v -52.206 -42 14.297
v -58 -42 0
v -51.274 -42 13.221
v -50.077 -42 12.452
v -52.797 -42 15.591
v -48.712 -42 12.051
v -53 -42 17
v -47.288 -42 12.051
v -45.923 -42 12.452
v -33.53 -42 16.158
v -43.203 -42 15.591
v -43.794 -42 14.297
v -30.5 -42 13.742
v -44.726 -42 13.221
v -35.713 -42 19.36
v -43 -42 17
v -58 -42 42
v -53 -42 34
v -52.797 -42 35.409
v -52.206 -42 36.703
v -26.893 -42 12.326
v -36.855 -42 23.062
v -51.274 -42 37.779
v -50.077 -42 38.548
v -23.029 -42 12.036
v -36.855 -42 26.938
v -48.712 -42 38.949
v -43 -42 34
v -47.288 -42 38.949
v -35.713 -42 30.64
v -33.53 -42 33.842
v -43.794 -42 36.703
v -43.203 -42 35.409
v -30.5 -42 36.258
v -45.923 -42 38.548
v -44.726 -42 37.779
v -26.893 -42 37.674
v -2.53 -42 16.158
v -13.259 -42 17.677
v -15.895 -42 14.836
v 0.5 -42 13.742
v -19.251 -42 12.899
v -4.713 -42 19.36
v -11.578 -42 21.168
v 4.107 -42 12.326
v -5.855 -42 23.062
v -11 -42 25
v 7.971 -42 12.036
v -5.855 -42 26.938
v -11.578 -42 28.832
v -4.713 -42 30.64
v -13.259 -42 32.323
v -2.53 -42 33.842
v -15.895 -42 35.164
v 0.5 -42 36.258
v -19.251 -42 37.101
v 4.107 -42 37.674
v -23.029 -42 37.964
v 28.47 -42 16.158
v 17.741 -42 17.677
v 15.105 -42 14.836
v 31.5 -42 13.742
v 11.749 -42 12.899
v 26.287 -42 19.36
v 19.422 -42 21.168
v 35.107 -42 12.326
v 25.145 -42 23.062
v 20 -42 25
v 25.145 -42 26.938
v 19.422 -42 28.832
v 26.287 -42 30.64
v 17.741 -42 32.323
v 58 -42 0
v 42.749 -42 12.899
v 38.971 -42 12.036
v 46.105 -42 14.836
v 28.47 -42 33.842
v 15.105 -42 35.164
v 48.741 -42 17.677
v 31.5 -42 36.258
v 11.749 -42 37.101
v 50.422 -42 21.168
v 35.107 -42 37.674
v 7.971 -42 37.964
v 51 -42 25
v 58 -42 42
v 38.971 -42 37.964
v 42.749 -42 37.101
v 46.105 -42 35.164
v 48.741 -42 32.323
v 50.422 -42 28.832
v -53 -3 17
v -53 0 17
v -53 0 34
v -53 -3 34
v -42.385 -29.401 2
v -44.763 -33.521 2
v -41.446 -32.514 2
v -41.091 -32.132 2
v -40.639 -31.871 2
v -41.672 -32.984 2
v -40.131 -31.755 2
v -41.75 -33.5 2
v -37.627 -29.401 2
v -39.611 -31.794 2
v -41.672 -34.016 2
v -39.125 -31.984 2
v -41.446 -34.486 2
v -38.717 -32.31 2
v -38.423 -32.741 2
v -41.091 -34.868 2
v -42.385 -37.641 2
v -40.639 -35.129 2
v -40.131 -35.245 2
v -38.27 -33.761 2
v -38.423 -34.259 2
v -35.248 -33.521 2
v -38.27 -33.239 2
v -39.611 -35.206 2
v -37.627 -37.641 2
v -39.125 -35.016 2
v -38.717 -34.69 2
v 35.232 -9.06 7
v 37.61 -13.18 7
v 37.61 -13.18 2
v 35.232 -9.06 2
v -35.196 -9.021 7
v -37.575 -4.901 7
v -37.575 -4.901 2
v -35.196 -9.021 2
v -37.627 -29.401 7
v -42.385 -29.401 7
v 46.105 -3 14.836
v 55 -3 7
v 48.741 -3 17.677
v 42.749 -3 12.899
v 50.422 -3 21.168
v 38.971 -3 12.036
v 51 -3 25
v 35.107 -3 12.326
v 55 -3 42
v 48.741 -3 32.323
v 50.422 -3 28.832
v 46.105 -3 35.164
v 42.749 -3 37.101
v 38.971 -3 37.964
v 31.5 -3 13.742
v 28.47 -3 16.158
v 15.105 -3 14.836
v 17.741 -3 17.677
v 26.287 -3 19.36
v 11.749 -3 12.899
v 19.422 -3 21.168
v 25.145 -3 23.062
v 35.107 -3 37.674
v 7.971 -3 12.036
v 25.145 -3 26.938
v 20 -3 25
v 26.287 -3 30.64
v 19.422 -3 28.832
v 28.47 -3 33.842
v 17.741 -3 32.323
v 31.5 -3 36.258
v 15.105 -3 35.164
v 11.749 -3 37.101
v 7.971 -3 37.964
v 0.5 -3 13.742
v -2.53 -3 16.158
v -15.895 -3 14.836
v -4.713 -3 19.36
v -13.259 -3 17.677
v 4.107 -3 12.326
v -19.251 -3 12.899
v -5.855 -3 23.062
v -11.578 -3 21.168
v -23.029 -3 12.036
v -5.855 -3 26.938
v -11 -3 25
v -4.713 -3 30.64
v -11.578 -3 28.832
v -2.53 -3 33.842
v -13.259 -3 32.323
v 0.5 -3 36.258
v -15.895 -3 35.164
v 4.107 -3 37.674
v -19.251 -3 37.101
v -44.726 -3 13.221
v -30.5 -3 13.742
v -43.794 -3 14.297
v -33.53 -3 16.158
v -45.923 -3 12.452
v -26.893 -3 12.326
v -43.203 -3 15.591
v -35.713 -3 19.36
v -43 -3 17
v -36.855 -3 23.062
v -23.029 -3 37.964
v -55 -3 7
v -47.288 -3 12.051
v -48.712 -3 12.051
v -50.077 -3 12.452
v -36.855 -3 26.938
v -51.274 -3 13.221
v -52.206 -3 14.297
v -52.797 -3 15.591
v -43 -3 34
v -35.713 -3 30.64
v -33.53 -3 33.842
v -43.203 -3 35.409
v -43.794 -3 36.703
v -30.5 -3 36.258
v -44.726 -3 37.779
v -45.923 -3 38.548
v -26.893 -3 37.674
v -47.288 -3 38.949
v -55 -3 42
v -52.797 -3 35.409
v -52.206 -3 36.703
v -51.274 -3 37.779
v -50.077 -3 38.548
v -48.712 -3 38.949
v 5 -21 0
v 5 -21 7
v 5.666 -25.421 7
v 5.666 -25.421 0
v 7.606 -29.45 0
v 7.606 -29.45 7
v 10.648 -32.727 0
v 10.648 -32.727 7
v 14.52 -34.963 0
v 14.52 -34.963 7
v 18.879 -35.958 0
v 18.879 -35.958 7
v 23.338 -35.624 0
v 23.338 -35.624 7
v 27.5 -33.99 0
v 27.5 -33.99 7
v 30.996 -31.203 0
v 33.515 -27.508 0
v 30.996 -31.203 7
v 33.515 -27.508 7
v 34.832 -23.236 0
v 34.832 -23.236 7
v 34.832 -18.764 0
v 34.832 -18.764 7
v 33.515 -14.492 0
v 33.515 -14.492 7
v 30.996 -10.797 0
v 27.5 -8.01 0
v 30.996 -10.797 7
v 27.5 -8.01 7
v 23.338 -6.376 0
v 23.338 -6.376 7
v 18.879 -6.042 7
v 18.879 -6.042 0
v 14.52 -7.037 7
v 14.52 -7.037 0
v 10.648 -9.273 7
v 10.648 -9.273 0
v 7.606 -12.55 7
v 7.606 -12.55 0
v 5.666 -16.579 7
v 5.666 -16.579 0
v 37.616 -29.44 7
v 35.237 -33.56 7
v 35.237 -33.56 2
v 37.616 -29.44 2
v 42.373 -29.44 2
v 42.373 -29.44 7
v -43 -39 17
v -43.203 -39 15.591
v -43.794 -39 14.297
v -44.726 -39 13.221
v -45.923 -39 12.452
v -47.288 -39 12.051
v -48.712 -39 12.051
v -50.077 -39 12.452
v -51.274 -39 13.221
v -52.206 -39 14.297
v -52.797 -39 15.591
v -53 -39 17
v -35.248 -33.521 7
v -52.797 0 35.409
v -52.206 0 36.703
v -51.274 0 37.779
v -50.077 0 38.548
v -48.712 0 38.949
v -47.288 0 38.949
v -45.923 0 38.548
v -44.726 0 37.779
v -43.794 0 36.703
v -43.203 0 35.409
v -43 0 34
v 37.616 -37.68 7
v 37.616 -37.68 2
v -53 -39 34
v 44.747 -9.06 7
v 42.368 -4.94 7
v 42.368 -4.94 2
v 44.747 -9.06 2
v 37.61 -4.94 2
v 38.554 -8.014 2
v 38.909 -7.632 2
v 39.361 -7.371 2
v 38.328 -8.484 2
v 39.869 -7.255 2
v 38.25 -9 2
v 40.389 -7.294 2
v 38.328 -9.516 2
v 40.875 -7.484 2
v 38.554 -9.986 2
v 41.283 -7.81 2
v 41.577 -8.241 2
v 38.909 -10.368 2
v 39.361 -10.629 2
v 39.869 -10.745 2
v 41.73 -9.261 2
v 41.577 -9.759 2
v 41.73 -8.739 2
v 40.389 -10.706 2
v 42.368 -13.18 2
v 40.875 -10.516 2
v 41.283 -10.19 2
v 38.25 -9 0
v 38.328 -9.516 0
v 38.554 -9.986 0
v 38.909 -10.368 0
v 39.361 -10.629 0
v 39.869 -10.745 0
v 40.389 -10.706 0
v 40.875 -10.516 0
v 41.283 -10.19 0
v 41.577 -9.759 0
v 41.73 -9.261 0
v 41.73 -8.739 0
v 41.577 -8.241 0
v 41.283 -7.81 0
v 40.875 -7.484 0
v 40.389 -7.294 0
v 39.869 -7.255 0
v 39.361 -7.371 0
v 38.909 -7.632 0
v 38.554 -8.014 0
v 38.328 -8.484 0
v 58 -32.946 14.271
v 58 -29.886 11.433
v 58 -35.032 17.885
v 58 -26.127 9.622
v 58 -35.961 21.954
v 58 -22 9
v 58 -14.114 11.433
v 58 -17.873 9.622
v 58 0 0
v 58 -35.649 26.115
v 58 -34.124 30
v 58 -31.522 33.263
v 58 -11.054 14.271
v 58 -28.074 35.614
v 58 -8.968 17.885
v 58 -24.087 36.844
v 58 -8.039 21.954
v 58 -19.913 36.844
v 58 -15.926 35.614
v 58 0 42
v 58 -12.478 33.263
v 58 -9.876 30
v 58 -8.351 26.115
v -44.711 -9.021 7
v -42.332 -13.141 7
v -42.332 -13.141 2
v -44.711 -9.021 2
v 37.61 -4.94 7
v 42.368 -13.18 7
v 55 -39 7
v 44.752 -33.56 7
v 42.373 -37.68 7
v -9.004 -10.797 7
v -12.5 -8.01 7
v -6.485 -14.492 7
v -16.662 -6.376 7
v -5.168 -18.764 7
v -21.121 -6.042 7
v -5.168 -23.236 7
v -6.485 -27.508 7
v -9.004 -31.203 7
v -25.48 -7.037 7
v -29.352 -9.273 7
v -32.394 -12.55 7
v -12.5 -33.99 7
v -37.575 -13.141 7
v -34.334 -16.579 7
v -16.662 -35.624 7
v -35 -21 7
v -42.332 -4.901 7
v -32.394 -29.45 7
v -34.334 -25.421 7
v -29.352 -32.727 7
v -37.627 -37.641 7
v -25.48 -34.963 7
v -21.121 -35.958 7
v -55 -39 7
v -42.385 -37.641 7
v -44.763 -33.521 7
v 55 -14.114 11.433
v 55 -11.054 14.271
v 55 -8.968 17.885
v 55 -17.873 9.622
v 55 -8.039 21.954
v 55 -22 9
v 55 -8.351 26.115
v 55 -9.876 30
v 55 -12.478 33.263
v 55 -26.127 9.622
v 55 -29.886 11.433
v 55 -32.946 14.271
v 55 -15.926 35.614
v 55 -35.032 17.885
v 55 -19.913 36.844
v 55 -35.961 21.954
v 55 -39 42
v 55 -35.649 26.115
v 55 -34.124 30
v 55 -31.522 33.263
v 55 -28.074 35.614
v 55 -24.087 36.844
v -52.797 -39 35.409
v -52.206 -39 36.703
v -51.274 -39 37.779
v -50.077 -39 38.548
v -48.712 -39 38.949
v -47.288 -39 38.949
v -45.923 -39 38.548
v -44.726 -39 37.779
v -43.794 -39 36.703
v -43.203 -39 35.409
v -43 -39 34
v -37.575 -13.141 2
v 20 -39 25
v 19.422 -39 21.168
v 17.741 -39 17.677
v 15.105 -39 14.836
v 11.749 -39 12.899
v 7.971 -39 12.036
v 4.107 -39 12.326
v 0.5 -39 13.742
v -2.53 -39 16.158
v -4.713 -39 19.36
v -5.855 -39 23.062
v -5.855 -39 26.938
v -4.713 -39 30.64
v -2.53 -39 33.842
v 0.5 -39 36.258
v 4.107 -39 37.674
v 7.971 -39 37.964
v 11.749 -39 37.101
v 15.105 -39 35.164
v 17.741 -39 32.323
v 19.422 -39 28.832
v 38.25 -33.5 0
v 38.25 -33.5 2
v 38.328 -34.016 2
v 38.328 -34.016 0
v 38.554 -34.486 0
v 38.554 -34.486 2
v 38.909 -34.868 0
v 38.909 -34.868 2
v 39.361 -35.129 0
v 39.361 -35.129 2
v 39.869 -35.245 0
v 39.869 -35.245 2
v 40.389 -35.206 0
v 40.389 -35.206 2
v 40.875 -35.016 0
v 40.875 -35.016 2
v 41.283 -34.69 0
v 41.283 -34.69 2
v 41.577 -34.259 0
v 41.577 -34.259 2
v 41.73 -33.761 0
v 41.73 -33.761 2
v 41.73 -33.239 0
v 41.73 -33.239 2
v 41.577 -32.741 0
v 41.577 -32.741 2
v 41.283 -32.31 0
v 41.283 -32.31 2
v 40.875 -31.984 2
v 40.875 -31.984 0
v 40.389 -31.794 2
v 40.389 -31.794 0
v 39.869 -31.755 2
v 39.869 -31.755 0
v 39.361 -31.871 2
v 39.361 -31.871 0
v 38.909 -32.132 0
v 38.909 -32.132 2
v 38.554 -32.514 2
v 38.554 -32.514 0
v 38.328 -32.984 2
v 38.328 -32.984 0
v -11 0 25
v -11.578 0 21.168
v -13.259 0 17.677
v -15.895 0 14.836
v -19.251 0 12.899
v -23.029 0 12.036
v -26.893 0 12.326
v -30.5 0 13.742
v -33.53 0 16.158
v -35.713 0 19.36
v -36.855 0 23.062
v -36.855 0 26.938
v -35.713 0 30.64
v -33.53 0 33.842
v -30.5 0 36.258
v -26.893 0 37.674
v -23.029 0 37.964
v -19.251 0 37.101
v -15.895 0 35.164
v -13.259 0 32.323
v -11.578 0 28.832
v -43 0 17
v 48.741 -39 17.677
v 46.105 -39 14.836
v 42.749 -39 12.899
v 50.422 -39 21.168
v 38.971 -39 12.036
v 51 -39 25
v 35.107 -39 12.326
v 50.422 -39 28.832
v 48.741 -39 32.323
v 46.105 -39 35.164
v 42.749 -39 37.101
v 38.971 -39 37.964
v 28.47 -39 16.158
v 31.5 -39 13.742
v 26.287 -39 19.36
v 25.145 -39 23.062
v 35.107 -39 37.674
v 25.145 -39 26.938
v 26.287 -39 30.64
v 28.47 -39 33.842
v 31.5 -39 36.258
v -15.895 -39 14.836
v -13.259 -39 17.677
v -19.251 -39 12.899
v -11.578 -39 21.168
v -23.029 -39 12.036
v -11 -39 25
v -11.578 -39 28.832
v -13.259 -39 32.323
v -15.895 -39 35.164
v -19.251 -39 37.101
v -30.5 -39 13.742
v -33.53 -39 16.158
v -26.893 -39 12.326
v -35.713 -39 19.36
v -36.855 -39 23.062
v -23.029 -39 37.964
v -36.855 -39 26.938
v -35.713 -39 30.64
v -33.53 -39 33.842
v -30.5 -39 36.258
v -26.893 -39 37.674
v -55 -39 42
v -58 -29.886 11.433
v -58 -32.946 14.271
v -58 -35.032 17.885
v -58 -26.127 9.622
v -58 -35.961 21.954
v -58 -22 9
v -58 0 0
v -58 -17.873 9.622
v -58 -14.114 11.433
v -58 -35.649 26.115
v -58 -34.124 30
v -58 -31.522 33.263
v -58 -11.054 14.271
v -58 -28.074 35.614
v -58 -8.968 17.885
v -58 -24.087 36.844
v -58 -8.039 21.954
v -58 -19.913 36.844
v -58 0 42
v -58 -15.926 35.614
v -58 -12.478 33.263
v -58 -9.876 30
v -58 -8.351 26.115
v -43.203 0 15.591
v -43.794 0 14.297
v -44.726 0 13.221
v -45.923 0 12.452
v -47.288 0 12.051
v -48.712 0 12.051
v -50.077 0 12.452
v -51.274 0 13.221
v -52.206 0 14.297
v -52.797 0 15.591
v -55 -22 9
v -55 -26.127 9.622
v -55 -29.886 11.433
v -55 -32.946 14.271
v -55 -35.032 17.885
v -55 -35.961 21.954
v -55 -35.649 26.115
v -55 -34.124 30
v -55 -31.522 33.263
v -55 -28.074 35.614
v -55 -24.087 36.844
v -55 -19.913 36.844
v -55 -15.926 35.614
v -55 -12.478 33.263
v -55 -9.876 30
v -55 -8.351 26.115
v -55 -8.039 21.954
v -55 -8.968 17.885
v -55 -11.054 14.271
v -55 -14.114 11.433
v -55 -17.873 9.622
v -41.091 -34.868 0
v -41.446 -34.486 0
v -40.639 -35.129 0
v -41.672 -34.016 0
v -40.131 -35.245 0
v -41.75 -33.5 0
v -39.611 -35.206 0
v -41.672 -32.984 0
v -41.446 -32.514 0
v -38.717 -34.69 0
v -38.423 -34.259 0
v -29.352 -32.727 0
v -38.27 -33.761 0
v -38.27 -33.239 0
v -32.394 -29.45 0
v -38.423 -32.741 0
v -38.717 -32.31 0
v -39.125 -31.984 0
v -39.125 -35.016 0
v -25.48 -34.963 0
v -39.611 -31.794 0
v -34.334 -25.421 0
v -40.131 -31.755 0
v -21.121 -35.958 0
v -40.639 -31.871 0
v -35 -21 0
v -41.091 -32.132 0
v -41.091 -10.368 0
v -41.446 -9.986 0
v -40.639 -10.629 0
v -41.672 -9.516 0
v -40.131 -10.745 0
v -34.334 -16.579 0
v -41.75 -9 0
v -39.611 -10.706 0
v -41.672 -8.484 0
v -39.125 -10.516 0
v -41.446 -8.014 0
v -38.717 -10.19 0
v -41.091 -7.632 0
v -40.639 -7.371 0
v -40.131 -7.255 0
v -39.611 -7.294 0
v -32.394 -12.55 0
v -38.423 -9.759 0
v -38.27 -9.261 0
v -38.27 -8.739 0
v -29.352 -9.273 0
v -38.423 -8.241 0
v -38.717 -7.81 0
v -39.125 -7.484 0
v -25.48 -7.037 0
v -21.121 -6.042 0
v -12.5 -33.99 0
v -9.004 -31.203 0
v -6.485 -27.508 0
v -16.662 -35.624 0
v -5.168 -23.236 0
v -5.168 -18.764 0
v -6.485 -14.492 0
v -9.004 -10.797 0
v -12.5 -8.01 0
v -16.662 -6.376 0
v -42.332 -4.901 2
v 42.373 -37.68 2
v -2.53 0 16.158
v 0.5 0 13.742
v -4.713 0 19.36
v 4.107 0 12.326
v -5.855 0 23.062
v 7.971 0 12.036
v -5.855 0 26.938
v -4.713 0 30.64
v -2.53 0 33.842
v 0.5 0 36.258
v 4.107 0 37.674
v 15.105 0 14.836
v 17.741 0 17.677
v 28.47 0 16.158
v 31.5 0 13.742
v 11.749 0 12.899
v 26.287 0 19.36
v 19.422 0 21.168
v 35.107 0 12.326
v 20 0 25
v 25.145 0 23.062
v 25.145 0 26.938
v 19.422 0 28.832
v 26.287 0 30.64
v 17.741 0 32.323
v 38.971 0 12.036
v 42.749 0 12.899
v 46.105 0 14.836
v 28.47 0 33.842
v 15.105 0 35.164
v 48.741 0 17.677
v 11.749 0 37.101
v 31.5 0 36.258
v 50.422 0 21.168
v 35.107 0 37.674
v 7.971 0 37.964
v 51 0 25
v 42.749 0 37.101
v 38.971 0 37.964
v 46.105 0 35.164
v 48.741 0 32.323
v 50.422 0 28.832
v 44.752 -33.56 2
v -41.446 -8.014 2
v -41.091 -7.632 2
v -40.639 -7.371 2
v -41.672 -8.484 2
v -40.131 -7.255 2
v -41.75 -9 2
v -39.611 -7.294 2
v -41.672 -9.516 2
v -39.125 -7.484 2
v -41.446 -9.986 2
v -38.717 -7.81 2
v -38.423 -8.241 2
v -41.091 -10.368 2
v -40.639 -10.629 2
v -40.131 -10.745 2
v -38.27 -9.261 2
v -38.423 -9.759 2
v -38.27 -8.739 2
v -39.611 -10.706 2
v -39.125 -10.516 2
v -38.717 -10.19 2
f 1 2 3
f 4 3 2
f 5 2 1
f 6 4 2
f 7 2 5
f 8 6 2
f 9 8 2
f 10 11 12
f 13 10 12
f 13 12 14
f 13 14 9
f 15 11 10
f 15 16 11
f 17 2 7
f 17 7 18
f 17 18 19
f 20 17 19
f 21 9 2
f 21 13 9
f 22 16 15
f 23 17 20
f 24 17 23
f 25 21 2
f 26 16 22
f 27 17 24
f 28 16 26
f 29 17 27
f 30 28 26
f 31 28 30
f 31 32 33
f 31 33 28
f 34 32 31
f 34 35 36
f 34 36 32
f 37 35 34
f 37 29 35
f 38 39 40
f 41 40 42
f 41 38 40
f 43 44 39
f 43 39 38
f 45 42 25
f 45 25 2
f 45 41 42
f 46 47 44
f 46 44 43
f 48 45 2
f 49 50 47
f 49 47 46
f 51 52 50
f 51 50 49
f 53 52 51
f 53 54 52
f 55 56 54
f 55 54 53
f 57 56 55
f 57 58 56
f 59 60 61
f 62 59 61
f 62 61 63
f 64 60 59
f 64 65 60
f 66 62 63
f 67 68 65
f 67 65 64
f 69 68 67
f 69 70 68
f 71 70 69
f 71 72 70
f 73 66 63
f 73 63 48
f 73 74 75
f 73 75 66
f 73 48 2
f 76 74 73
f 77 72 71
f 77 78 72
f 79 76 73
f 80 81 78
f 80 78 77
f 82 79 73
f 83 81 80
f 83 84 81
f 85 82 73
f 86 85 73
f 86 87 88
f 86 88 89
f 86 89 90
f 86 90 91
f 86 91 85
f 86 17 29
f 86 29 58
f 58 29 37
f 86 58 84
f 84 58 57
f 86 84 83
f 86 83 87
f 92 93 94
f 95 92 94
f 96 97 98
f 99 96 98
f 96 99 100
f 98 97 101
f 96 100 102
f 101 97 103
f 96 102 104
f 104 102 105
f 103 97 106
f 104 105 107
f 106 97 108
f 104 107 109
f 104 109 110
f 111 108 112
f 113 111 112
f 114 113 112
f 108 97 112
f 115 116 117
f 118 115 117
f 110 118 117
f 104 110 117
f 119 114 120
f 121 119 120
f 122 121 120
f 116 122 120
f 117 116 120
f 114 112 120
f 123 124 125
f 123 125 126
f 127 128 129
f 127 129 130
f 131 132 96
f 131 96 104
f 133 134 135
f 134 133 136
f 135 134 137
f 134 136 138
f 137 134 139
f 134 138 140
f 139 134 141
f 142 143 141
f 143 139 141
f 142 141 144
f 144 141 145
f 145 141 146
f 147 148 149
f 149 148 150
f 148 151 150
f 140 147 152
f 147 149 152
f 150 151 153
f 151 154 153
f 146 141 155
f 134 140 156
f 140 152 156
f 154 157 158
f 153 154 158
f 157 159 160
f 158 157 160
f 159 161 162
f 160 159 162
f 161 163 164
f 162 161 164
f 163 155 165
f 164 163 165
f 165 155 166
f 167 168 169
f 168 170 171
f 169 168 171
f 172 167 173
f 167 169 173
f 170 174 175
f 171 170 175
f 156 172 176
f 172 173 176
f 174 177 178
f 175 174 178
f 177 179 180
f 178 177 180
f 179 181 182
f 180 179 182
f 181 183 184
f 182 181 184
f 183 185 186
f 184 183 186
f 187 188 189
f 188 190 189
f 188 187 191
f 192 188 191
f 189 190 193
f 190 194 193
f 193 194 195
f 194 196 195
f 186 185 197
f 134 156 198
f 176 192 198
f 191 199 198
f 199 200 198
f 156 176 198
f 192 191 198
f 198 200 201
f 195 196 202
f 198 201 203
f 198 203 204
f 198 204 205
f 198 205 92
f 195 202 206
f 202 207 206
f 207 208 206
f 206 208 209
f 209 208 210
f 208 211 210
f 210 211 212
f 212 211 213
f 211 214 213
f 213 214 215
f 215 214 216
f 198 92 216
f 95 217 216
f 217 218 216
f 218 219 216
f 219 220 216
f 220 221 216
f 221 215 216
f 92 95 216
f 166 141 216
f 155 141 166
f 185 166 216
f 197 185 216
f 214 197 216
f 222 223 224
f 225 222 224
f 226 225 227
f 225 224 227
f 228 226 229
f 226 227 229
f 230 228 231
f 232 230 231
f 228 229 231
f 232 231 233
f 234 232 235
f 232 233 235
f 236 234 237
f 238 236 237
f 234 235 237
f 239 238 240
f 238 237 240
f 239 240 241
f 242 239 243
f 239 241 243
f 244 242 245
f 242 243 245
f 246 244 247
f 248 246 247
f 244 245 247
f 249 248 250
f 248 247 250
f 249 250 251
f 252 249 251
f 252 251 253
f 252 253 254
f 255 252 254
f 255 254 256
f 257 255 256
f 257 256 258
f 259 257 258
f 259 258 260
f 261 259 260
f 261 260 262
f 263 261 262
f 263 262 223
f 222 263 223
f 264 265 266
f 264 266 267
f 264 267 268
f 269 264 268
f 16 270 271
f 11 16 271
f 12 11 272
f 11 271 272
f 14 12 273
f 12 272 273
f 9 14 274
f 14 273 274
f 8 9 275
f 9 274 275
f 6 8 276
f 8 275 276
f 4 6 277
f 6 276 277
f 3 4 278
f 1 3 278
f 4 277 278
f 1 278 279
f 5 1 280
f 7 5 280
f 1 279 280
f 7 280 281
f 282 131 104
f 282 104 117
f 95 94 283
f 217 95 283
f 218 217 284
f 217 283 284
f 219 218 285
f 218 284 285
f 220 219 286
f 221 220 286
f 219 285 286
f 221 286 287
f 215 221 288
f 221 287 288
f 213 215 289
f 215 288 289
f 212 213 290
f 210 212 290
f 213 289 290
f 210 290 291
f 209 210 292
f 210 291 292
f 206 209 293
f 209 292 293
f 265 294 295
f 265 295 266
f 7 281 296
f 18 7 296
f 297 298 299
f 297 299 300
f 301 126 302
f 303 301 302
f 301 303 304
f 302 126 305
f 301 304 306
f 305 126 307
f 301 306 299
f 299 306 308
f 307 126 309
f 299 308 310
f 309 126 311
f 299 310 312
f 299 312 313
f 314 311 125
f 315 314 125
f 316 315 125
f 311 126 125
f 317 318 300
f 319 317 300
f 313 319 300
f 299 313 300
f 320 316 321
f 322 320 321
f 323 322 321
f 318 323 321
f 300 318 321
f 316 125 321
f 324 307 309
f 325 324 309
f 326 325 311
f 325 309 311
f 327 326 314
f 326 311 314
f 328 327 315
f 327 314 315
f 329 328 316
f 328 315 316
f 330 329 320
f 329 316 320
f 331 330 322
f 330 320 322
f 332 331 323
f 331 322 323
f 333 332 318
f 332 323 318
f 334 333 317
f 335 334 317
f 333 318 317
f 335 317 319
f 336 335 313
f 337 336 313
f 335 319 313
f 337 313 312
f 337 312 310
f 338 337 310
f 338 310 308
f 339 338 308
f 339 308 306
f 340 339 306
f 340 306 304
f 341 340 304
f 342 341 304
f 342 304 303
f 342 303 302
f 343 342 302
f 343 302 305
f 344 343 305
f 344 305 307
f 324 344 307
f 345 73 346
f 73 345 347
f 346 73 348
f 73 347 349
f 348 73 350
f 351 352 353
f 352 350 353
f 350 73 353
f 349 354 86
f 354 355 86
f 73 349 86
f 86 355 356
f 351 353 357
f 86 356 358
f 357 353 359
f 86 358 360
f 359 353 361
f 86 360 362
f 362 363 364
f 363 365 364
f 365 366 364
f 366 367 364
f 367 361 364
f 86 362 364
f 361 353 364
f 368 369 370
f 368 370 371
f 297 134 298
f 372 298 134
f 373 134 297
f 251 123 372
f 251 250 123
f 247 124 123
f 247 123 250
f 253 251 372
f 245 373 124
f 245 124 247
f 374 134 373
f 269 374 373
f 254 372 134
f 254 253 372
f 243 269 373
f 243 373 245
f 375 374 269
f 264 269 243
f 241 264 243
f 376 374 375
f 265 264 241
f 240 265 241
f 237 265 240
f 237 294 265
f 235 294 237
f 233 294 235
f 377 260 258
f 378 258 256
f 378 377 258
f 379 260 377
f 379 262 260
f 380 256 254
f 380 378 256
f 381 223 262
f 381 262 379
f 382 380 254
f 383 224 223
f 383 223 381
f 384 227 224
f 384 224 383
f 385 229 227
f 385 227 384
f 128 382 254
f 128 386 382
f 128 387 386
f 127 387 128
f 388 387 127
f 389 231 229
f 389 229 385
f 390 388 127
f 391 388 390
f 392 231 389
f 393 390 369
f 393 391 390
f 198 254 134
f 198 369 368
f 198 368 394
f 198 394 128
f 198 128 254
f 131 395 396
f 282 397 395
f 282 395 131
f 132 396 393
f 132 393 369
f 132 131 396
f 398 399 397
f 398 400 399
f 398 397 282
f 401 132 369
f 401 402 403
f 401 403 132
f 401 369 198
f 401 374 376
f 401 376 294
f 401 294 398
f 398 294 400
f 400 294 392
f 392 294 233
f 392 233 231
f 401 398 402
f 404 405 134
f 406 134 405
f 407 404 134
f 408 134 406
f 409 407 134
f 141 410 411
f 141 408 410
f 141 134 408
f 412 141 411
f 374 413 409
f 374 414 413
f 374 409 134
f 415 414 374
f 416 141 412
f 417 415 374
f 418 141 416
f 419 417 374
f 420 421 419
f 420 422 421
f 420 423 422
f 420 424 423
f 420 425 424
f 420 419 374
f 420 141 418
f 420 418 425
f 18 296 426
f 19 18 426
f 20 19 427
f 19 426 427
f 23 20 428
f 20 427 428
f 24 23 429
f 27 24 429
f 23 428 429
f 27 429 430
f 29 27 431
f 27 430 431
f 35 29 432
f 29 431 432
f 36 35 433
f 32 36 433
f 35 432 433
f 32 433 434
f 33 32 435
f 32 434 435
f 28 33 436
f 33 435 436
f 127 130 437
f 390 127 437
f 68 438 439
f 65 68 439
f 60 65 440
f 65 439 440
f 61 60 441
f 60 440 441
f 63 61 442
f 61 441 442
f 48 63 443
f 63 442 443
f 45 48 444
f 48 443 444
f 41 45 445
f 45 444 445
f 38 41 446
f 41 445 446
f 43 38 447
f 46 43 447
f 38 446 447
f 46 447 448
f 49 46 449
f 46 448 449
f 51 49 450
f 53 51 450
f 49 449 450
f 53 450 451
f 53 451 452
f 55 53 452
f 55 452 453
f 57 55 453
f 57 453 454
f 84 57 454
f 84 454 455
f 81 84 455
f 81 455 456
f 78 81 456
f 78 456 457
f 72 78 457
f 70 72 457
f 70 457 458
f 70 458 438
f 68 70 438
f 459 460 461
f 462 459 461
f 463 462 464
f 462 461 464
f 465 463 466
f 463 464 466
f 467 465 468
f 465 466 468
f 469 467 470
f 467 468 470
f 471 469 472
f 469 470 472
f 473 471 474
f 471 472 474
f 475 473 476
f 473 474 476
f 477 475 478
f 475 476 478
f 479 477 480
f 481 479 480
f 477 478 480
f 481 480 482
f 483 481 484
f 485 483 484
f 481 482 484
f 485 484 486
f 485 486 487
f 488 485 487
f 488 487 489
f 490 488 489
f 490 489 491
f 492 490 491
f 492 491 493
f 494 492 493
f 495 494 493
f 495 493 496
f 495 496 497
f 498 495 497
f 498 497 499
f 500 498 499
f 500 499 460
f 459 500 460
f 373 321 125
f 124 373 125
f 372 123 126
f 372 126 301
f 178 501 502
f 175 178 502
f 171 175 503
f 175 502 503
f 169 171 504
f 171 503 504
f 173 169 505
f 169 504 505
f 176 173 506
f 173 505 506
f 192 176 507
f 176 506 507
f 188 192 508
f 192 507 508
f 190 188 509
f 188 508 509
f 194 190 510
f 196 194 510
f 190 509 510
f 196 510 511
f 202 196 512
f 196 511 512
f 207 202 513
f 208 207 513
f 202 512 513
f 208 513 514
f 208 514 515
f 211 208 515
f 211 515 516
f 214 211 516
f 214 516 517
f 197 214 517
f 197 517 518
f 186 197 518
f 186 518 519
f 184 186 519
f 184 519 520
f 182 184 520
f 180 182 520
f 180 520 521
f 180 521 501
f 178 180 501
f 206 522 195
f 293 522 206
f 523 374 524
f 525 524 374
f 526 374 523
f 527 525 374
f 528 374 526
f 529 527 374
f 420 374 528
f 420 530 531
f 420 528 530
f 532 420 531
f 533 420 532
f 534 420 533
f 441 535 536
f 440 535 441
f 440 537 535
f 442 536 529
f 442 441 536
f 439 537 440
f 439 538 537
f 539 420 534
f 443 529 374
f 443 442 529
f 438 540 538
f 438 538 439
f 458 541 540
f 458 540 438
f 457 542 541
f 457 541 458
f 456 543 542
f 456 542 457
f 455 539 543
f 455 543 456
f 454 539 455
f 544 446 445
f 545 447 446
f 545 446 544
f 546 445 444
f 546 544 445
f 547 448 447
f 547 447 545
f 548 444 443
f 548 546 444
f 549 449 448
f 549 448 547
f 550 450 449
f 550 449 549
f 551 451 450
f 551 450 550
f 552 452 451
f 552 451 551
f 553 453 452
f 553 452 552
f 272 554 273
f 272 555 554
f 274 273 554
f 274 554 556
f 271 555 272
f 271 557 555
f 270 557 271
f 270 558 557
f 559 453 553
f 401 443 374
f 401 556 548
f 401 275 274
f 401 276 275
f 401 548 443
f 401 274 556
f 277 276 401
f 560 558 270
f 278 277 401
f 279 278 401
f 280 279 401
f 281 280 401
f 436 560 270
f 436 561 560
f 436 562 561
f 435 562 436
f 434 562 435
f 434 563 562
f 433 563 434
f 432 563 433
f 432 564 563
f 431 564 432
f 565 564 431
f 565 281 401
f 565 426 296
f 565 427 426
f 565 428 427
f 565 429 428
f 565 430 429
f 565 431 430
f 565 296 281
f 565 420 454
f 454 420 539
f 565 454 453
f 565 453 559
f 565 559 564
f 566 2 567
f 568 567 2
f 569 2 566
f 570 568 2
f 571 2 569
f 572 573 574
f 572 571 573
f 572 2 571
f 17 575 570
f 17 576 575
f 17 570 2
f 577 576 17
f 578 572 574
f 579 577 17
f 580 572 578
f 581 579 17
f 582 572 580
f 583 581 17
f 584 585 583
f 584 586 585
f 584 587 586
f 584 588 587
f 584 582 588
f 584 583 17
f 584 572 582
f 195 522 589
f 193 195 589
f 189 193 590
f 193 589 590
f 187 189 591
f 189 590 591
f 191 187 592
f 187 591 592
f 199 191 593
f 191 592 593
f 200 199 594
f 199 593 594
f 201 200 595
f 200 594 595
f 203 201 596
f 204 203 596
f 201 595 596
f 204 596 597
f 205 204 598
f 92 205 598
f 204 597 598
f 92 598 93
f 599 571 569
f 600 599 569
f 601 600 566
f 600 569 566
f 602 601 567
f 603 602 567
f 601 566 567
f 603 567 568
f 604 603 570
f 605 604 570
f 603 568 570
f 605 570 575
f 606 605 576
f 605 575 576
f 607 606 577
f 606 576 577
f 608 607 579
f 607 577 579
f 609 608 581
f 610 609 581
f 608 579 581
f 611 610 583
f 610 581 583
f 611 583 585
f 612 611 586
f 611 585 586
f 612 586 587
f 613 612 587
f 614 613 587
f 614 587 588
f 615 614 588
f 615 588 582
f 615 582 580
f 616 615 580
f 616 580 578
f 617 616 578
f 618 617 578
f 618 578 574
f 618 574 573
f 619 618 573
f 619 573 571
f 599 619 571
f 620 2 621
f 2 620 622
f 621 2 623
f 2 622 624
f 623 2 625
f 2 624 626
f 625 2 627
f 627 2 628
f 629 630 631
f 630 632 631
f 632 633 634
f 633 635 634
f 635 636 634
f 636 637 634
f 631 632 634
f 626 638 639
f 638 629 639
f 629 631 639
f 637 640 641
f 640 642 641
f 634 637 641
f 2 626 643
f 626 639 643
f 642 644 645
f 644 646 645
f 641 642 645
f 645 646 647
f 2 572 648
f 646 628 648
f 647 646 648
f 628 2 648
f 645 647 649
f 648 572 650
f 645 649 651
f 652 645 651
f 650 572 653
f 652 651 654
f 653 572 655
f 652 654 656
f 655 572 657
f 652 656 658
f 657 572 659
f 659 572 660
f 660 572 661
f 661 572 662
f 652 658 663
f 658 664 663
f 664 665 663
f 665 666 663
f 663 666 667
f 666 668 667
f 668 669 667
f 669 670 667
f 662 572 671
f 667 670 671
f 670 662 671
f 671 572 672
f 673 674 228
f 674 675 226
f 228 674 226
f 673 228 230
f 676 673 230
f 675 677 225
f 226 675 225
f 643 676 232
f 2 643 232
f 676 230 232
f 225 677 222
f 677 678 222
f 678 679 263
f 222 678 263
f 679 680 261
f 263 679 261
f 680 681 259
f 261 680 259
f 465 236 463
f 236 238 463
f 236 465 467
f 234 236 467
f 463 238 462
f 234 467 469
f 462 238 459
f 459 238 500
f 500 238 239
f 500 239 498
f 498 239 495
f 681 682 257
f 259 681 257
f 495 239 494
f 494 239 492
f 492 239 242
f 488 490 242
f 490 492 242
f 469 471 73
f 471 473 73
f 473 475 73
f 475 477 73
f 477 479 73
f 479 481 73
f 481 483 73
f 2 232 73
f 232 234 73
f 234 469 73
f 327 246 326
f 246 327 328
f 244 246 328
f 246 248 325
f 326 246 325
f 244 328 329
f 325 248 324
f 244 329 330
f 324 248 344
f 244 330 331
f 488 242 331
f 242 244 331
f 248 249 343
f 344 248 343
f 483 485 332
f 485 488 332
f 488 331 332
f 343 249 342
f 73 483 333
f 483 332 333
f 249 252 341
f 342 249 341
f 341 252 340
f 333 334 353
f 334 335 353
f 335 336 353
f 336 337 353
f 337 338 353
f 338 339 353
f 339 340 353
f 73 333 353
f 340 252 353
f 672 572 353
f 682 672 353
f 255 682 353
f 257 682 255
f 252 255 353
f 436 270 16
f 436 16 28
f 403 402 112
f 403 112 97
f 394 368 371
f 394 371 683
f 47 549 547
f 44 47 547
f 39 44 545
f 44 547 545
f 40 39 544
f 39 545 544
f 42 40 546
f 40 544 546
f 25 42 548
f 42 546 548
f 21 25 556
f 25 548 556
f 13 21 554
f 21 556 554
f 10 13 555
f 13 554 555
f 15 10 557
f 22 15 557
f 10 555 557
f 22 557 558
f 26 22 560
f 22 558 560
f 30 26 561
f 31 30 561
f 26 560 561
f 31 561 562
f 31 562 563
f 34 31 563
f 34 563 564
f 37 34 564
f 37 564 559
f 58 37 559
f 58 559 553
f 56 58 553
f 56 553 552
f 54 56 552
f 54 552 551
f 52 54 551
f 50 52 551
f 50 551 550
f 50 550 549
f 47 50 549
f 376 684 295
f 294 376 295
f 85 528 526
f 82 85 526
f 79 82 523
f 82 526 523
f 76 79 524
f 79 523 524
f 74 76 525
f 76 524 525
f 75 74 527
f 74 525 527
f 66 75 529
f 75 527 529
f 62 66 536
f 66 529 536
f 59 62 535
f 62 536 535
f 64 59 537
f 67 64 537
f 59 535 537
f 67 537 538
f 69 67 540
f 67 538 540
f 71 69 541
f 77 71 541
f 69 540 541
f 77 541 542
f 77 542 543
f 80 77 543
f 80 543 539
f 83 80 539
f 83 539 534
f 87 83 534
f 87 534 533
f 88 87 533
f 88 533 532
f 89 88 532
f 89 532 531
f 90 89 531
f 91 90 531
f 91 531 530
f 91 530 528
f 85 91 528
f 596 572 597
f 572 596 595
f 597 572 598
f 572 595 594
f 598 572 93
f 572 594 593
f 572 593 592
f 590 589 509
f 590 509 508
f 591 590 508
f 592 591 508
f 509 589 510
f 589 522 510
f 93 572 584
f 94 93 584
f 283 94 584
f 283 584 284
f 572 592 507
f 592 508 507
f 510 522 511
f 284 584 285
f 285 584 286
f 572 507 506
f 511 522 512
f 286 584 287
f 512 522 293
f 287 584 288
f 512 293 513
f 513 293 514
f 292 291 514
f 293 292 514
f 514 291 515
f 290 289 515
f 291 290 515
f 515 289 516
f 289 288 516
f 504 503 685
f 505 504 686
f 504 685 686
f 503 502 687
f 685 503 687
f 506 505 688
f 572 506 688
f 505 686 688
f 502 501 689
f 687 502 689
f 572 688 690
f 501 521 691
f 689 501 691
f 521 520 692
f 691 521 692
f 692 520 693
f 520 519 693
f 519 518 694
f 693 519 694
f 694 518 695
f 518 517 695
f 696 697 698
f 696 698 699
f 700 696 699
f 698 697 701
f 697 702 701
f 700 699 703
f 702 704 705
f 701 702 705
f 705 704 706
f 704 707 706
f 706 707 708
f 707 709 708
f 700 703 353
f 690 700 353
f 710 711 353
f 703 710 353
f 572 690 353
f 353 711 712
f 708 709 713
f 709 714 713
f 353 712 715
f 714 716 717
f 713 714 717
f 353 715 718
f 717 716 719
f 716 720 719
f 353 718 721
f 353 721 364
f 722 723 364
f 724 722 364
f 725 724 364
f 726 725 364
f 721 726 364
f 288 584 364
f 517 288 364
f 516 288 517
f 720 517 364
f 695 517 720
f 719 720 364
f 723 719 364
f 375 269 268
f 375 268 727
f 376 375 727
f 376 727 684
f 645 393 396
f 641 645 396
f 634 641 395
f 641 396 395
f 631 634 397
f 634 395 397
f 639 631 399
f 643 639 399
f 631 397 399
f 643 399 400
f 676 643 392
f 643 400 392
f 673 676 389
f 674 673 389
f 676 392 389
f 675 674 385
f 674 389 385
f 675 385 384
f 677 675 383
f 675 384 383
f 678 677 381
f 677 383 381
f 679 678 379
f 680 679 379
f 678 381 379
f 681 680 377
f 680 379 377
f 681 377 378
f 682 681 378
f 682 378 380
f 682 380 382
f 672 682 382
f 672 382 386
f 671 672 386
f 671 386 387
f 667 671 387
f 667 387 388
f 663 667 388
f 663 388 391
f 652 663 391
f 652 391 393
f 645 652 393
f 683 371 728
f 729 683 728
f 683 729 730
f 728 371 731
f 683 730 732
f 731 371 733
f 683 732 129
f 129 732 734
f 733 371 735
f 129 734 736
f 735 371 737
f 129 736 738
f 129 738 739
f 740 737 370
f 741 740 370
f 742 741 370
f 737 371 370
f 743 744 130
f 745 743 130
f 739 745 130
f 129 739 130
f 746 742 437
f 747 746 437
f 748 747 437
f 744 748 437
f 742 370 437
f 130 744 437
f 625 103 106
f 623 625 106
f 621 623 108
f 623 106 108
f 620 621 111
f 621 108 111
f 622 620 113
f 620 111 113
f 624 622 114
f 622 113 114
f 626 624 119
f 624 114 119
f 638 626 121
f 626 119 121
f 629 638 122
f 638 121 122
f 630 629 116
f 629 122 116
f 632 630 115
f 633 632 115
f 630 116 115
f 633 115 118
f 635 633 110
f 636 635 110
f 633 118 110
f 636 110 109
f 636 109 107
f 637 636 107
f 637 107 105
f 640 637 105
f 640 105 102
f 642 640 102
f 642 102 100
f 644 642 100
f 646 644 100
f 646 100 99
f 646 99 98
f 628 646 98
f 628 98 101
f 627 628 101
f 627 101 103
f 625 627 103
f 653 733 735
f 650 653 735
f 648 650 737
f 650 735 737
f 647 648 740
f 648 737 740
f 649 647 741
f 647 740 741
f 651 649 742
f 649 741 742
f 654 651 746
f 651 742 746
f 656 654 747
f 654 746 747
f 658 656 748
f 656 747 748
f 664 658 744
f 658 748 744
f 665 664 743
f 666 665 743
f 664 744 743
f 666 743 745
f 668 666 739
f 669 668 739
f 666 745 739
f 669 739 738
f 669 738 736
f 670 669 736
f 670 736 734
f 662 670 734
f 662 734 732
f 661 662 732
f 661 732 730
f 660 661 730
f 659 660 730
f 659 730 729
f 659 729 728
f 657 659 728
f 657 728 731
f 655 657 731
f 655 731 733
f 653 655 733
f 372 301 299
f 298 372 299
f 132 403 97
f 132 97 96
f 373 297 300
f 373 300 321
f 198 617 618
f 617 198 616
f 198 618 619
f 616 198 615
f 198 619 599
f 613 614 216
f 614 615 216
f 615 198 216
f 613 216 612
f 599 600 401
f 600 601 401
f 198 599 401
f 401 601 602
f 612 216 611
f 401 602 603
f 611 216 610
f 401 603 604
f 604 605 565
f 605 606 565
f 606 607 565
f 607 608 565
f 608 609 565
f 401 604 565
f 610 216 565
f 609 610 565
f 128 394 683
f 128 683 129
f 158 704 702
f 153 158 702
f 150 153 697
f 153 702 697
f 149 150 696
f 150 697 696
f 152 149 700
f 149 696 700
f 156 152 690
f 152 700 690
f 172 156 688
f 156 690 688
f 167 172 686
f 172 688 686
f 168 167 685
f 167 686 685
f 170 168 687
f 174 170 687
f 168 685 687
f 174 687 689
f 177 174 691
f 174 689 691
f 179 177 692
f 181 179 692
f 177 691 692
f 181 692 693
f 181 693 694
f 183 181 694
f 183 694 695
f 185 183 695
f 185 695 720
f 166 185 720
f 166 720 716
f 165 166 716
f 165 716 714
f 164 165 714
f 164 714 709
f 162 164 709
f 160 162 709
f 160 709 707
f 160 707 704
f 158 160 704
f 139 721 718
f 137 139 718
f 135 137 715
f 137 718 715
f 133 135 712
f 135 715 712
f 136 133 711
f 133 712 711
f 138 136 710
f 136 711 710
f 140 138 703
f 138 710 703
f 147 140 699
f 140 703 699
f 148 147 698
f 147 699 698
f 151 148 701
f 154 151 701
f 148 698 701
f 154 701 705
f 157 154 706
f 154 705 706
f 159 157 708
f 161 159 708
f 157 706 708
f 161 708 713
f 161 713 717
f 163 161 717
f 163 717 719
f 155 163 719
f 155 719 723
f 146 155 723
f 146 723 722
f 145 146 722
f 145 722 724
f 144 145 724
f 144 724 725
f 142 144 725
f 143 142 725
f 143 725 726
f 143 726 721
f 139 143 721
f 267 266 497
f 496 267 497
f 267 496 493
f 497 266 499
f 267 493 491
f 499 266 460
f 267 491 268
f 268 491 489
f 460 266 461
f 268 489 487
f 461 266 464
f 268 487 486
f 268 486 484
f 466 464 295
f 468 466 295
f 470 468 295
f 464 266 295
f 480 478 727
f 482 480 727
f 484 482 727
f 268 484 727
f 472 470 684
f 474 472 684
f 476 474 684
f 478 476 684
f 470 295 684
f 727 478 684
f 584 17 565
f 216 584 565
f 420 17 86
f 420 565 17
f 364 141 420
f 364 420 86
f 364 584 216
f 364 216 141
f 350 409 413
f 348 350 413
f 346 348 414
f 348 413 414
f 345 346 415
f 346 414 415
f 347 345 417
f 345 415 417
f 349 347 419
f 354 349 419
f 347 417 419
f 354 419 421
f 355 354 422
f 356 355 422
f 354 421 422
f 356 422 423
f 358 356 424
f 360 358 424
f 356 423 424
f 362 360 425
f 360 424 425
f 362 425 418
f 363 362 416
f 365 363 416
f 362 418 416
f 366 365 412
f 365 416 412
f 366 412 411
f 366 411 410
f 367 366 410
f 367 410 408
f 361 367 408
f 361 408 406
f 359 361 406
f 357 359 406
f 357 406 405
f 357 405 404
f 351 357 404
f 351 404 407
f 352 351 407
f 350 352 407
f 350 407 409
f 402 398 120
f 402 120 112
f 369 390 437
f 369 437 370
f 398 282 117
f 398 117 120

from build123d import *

# Parameters (mm, degrees)
SKETCH_W        = 116
SKETCH_H        = 42
PAD_DEPTH       = 42
SKETCH005_W     = 110
SKETCH005_H     = 36
POCKET_DEPTH    = 35
SKETCH006_R     = 1.75
SKETCH006_R_2   = 15
POCKET001_DEPTH = 7.001
POCKET002_DEPTH = 5
SKETCH007_R     = 13
POCKET003_DEPTH = 42.001
SKETCH008_R     = 14
POCKET004_DEPTH = 116.001


with BuildPart() as part:
    # Sketch → Pad (new body)
    with BuildSketch(Plane.XZ):
        with Locations((0, 21)):
            Rectangle(SKETCH_W, SKETCH_H)
    extrude(amount=PAD_DEPTH)

    # Sketch005 → Pocket (cut)
    with BuildSketch(Plane(origin=(0, 0, 42), x_dir=(-1, 0, 0), z_dir=(0, 0, 1))):
        with Locations((0, 21)):
            Rectangle(SKETCH005_W, SKETCH005_H)
    extrude(amount=-POCKET_DEPTH, mode=Mode.SUBTRACT)

    # Sketch006 → Pocket001 (cut, through all)
    with BuildSketch(Plane(origin=(0, 0, 7), x_dir=(-1, 0, 0), z_dir=(0, 0, 1))):
        with Locations((-40, 33.5)):
            Circle(SKETCH006_R)
        with Locations((40, 33.5)):
            Circle(SKETCH006_R)
        with Locations((-40, 9)):
            Circle(SKETCH006_R)
        with Locations((40, 9)):
            Circle(SKETCH006_R)
        with Locations((-20, 21)):
            Circle(SKETCH006_R_2)
        with Locations((20, 21)):
            Circle(SKETCH006_R_2)
    extrude(amount=-POCKET001_DEPTH, mode=Mode.SUBTRACT)

    # Sketch011 → Pocket002 (cut)
    with BuildSketch(Plane(origin=(0, 0, 7), x_dir=(-1, 0, 0), z_dir=(0, 0, 1))):
        Polygon((-42.373287, 37.679591), (-37.615921, 37.679591), (-35.237238, 33.559591), (-37.615921, 29.439591), (-42.373287, 29.439591), (-44.75197, 33.559591), align=None)
        Polygon((37.627177, 37.64135), (42.384544, 37.64135), (44.763227, 33.52135), (42.384544, 29.40135), (37.627177, 29.40135), (35.248494, 33.52135), align=None)
        Polygon((37.575129, 13.14135), (42.332495, 13.14135), (44.711178, 9.02135), (42.332495, 4.90135), (37.575129, 4.90135), (35.196446, 9.02135), align=None)
        Polygon((-42.367844, 13.179591), (-37.610478, 13.179591), (-35.231795, 9.059591), (-37.610478, 4.939591), (-42.367844, 4.939591), (-44.746527, 9.059591), align=None)
    extrude(amount=-POCKET002_DEPTH, mode=Mode.SUBTRACT)

    # Sketch007 → Pocket003 (cut, through all)
    with BuildSketch(Plane(origin=(0, 0, 0), x_dir=(1, 0, 0), z_dir=(0, 1, 0))):
        with Locations((-24, -25)):
            Circle(SKETCH007_R)
        with Locations((7, -25)):
            Circle(SKETCH007_R)
        with Locations((38, -25)):
            Circle(SKETCH007_R)
        with BuildLine():
            ThreePointArc((-43, -16.999991), (-48, -12), (-53, -16.999992))
            Line((-53, -16.999992), (-53, -33.999979))
            ThreePointArc((-53, -33.999979), (-48, -39), (-43, -33.999978))
            Line((-43, -16.999991), (-43, -33.999978))
        make_face()
    extrude(amount=-POCKET003_DEPTH, mode=Mode.SUBTRACT)

    # Sketch008 → Pocket004 (cut, through all)
    with BuildSketch(Plane(origin=(-58, 0, 0), x_dir=(0, 0, -1), z_dir=(-1, 0, 0))):
        with Locations((-23, 22)):
            Circle(SKETCH008_R)
    extrude(amount=-POCKET004_DEPTH, mode=Mode.SUBTRACT)


solid = part.part
